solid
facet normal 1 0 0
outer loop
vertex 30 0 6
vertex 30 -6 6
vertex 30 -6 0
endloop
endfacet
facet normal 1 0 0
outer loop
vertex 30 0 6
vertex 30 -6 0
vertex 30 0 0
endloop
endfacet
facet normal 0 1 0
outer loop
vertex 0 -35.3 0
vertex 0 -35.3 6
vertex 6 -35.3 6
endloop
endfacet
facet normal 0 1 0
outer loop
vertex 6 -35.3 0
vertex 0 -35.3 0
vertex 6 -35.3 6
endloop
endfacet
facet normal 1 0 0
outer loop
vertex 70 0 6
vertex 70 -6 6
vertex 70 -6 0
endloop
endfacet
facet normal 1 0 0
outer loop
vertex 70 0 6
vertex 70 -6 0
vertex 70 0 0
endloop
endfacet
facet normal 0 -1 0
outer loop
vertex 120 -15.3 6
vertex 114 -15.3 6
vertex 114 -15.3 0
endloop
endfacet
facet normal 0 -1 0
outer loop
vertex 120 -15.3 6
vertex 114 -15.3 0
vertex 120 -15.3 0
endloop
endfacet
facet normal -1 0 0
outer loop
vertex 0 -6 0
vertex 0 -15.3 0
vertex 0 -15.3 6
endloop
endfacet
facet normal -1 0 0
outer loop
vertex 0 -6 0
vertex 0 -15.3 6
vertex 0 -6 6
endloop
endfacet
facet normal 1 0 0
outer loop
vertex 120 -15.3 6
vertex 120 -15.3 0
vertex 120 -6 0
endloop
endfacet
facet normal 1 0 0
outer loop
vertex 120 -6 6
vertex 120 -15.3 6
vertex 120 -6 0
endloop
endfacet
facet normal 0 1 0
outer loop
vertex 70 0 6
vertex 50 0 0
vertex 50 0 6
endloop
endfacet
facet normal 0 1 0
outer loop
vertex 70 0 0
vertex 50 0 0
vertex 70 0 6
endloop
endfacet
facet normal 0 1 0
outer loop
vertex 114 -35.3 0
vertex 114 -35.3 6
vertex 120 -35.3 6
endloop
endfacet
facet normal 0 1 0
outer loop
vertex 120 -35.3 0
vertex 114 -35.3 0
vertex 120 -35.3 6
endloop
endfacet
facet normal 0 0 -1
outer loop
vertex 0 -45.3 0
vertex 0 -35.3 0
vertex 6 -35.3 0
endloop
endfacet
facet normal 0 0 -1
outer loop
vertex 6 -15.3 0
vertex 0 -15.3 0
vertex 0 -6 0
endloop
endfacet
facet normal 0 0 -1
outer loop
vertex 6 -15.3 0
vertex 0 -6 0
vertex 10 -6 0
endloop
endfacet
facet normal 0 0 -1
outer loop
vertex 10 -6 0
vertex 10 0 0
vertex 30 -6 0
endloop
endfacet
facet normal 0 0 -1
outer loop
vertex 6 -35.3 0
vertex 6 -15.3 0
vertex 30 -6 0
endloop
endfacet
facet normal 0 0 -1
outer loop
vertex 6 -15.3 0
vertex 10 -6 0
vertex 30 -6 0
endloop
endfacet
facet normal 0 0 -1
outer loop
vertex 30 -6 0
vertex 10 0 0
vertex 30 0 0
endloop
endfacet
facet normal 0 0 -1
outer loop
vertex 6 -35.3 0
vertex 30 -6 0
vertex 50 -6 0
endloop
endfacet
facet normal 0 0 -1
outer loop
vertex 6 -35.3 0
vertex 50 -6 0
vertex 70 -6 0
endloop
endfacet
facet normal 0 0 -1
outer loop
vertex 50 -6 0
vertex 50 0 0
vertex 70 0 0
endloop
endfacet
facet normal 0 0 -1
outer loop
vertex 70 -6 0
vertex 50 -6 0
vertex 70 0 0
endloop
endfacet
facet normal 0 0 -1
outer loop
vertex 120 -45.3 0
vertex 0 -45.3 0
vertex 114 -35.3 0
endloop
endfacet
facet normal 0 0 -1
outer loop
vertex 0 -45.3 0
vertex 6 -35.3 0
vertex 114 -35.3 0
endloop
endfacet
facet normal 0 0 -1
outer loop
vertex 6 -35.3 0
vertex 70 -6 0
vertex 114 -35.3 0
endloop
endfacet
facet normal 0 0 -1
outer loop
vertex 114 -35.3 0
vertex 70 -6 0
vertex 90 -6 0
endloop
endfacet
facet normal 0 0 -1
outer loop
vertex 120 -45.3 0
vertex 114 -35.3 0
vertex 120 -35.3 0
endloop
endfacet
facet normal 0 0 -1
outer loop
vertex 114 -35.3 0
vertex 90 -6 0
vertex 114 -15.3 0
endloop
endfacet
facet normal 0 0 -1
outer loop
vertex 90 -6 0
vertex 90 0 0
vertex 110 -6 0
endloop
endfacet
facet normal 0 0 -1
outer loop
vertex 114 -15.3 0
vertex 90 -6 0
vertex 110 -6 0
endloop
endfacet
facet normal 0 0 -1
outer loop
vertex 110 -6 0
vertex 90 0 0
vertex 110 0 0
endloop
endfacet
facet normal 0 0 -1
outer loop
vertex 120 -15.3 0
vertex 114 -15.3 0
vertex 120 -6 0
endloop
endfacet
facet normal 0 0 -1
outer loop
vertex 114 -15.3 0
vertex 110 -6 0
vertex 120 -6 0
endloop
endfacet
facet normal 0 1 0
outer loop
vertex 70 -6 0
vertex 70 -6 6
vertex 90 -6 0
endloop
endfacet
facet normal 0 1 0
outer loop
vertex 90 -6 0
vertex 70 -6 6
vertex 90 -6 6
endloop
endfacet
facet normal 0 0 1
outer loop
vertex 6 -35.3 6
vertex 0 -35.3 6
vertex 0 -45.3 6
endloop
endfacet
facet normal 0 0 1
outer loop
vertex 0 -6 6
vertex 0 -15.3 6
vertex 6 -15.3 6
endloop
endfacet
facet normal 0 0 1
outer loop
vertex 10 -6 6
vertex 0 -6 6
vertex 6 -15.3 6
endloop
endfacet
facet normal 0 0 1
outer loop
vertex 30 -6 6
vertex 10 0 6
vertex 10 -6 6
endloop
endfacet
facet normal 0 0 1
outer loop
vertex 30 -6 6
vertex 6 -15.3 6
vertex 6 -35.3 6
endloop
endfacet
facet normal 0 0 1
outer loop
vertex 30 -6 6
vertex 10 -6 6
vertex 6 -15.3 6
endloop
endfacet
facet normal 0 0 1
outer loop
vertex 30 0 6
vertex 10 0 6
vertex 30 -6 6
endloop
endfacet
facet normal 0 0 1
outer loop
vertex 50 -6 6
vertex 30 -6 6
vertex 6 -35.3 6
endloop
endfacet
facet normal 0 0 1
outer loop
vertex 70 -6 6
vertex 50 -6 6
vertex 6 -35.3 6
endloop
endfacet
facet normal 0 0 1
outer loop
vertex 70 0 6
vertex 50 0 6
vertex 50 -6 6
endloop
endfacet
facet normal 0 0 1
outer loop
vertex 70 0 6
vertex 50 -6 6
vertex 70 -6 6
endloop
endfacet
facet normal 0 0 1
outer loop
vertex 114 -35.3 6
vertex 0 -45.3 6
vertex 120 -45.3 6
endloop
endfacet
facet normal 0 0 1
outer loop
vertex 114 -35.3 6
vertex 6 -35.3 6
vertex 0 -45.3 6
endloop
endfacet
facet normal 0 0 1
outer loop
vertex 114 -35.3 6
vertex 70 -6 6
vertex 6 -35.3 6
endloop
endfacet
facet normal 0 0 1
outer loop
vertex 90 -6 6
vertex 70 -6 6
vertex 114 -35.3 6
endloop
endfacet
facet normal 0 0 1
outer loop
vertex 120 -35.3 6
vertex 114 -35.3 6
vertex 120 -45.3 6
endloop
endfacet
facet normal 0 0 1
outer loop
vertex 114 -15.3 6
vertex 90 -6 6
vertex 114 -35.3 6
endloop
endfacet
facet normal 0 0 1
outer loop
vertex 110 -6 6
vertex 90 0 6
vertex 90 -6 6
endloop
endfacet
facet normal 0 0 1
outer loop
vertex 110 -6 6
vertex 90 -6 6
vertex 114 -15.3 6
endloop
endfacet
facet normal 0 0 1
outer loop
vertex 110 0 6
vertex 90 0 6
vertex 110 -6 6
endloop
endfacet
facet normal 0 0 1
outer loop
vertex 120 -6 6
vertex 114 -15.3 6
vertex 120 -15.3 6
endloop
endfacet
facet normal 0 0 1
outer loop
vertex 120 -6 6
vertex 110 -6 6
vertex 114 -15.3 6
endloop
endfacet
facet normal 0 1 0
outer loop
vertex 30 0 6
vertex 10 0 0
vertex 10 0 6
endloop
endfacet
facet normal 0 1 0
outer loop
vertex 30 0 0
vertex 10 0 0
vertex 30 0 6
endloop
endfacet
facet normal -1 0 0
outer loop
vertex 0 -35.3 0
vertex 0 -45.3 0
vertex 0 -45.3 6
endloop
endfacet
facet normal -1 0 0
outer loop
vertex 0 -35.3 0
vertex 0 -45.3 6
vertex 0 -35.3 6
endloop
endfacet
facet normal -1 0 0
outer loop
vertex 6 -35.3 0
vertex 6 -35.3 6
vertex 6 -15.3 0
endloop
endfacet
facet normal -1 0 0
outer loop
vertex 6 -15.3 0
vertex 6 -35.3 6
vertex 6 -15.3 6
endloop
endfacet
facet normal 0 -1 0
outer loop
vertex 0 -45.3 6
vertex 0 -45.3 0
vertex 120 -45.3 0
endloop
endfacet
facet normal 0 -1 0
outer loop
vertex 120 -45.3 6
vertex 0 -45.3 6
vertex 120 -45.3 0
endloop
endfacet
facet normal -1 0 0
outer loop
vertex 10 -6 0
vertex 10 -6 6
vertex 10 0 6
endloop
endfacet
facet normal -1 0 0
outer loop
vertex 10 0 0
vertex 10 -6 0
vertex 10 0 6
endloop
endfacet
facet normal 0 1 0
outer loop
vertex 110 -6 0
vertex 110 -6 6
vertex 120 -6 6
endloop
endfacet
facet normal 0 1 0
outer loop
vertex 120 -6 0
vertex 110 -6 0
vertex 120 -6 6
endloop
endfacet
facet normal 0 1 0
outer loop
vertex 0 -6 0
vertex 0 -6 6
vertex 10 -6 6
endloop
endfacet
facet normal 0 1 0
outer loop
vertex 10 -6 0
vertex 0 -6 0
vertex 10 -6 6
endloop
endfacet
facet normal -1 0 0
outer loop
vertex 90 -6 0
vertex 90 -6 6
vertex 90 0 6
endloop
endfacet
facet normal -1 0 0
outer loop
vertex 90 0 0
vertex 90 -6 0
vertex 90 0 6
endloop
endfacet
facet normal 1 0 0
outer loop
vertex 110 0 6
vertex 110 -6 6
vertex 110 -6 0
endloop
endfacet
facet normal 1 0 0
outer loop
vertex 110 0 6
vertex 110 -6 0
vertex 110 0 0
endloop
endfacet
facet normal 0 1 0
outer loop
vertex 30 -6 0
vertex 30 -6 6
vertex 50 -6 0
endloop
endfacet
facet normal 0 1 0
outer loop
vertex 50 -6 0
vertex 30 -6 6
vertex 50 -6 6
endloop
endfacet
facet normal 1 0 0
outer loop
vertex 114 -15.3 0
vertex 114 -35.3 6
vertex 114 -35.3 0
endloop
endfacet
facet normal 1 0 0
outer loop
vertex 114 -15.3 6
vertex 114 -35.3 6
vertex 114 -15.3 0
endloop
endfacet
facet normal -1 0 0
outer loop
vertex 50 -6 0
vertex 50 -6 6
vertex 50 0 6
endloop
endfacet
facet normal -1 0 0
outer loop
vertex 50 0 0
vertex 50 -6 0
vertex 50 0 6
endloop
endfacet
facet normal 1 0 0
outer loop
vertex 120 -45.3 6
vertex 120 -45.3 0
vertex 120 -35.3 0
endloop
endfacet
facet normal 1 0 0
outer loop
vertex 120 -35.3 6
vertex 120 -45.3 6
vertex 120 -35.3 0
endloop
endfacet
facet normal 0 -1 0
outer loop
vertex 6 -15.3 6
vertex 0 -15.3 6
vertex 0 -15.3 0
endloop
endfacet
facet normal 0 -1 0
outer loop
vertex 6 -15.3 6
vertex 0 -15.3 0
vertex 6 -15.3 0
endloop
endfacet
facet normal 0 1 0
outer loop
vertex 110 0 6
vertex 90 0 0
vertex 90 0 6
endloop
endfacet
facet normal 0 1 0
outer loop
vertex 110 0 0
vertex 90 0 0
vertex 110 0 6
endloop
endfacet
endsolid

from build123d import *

# Parameters (mm, degrees)
SKETCH1_W           = 120
SKETCH1_H           = 45.3
BOSS_EXTRUDE1_DEPTH = 6
SKETCH2_W           = 10
SKETCH2_H           = 6
SKETCH2_W_2         = 20
SKETCH2_W_3         = 6
SKETCH2_H_2         = 20
CUT_EXTRUDE1_DEPTH  = 6


with BuildPart() as part:
    # Sketch1 → Boss-Extrude1 (new body)
    with BuildSketch(Plane.XY):
        with Locations((60, -22.65)):
            Rectangle(SKETCH1_W, SKETCH1_H)
    extrude(amount=BOSS_EXTRUDE1_DEPTH)

    # Sketch2 → Cut-Extrude1 (cut)
    with BuildSketch(Plane.XY.offset(6)):
        with Locations((5, -3)):
            Rectangle(SKETCH2_W, SKETCH2_H)
        with Locations((40, -3)):
            Rectangle(SKETCH2_W_2, SKETCH2_H)
        with Locations((80, -3)):
            Rectangle(SKETCH2_W_2, SKETCH2_H)
        with Locations((115, -3)):
            Rectangle(SKETCH2_W, SKETCH2_H)
        with Locations((117, -25.3)):
            Rectangle(SKETCH2_W_3, SKETCH2_H_2)
        with Locations((3, -25.3)):
            Rectangle(SKETCH2_W_3, SKETCH2_H_2)
    extrude(amount=-CUT_EXTRUDE1_DEPTH, mode=Mode.SUBTRACT)


solid = part.part
